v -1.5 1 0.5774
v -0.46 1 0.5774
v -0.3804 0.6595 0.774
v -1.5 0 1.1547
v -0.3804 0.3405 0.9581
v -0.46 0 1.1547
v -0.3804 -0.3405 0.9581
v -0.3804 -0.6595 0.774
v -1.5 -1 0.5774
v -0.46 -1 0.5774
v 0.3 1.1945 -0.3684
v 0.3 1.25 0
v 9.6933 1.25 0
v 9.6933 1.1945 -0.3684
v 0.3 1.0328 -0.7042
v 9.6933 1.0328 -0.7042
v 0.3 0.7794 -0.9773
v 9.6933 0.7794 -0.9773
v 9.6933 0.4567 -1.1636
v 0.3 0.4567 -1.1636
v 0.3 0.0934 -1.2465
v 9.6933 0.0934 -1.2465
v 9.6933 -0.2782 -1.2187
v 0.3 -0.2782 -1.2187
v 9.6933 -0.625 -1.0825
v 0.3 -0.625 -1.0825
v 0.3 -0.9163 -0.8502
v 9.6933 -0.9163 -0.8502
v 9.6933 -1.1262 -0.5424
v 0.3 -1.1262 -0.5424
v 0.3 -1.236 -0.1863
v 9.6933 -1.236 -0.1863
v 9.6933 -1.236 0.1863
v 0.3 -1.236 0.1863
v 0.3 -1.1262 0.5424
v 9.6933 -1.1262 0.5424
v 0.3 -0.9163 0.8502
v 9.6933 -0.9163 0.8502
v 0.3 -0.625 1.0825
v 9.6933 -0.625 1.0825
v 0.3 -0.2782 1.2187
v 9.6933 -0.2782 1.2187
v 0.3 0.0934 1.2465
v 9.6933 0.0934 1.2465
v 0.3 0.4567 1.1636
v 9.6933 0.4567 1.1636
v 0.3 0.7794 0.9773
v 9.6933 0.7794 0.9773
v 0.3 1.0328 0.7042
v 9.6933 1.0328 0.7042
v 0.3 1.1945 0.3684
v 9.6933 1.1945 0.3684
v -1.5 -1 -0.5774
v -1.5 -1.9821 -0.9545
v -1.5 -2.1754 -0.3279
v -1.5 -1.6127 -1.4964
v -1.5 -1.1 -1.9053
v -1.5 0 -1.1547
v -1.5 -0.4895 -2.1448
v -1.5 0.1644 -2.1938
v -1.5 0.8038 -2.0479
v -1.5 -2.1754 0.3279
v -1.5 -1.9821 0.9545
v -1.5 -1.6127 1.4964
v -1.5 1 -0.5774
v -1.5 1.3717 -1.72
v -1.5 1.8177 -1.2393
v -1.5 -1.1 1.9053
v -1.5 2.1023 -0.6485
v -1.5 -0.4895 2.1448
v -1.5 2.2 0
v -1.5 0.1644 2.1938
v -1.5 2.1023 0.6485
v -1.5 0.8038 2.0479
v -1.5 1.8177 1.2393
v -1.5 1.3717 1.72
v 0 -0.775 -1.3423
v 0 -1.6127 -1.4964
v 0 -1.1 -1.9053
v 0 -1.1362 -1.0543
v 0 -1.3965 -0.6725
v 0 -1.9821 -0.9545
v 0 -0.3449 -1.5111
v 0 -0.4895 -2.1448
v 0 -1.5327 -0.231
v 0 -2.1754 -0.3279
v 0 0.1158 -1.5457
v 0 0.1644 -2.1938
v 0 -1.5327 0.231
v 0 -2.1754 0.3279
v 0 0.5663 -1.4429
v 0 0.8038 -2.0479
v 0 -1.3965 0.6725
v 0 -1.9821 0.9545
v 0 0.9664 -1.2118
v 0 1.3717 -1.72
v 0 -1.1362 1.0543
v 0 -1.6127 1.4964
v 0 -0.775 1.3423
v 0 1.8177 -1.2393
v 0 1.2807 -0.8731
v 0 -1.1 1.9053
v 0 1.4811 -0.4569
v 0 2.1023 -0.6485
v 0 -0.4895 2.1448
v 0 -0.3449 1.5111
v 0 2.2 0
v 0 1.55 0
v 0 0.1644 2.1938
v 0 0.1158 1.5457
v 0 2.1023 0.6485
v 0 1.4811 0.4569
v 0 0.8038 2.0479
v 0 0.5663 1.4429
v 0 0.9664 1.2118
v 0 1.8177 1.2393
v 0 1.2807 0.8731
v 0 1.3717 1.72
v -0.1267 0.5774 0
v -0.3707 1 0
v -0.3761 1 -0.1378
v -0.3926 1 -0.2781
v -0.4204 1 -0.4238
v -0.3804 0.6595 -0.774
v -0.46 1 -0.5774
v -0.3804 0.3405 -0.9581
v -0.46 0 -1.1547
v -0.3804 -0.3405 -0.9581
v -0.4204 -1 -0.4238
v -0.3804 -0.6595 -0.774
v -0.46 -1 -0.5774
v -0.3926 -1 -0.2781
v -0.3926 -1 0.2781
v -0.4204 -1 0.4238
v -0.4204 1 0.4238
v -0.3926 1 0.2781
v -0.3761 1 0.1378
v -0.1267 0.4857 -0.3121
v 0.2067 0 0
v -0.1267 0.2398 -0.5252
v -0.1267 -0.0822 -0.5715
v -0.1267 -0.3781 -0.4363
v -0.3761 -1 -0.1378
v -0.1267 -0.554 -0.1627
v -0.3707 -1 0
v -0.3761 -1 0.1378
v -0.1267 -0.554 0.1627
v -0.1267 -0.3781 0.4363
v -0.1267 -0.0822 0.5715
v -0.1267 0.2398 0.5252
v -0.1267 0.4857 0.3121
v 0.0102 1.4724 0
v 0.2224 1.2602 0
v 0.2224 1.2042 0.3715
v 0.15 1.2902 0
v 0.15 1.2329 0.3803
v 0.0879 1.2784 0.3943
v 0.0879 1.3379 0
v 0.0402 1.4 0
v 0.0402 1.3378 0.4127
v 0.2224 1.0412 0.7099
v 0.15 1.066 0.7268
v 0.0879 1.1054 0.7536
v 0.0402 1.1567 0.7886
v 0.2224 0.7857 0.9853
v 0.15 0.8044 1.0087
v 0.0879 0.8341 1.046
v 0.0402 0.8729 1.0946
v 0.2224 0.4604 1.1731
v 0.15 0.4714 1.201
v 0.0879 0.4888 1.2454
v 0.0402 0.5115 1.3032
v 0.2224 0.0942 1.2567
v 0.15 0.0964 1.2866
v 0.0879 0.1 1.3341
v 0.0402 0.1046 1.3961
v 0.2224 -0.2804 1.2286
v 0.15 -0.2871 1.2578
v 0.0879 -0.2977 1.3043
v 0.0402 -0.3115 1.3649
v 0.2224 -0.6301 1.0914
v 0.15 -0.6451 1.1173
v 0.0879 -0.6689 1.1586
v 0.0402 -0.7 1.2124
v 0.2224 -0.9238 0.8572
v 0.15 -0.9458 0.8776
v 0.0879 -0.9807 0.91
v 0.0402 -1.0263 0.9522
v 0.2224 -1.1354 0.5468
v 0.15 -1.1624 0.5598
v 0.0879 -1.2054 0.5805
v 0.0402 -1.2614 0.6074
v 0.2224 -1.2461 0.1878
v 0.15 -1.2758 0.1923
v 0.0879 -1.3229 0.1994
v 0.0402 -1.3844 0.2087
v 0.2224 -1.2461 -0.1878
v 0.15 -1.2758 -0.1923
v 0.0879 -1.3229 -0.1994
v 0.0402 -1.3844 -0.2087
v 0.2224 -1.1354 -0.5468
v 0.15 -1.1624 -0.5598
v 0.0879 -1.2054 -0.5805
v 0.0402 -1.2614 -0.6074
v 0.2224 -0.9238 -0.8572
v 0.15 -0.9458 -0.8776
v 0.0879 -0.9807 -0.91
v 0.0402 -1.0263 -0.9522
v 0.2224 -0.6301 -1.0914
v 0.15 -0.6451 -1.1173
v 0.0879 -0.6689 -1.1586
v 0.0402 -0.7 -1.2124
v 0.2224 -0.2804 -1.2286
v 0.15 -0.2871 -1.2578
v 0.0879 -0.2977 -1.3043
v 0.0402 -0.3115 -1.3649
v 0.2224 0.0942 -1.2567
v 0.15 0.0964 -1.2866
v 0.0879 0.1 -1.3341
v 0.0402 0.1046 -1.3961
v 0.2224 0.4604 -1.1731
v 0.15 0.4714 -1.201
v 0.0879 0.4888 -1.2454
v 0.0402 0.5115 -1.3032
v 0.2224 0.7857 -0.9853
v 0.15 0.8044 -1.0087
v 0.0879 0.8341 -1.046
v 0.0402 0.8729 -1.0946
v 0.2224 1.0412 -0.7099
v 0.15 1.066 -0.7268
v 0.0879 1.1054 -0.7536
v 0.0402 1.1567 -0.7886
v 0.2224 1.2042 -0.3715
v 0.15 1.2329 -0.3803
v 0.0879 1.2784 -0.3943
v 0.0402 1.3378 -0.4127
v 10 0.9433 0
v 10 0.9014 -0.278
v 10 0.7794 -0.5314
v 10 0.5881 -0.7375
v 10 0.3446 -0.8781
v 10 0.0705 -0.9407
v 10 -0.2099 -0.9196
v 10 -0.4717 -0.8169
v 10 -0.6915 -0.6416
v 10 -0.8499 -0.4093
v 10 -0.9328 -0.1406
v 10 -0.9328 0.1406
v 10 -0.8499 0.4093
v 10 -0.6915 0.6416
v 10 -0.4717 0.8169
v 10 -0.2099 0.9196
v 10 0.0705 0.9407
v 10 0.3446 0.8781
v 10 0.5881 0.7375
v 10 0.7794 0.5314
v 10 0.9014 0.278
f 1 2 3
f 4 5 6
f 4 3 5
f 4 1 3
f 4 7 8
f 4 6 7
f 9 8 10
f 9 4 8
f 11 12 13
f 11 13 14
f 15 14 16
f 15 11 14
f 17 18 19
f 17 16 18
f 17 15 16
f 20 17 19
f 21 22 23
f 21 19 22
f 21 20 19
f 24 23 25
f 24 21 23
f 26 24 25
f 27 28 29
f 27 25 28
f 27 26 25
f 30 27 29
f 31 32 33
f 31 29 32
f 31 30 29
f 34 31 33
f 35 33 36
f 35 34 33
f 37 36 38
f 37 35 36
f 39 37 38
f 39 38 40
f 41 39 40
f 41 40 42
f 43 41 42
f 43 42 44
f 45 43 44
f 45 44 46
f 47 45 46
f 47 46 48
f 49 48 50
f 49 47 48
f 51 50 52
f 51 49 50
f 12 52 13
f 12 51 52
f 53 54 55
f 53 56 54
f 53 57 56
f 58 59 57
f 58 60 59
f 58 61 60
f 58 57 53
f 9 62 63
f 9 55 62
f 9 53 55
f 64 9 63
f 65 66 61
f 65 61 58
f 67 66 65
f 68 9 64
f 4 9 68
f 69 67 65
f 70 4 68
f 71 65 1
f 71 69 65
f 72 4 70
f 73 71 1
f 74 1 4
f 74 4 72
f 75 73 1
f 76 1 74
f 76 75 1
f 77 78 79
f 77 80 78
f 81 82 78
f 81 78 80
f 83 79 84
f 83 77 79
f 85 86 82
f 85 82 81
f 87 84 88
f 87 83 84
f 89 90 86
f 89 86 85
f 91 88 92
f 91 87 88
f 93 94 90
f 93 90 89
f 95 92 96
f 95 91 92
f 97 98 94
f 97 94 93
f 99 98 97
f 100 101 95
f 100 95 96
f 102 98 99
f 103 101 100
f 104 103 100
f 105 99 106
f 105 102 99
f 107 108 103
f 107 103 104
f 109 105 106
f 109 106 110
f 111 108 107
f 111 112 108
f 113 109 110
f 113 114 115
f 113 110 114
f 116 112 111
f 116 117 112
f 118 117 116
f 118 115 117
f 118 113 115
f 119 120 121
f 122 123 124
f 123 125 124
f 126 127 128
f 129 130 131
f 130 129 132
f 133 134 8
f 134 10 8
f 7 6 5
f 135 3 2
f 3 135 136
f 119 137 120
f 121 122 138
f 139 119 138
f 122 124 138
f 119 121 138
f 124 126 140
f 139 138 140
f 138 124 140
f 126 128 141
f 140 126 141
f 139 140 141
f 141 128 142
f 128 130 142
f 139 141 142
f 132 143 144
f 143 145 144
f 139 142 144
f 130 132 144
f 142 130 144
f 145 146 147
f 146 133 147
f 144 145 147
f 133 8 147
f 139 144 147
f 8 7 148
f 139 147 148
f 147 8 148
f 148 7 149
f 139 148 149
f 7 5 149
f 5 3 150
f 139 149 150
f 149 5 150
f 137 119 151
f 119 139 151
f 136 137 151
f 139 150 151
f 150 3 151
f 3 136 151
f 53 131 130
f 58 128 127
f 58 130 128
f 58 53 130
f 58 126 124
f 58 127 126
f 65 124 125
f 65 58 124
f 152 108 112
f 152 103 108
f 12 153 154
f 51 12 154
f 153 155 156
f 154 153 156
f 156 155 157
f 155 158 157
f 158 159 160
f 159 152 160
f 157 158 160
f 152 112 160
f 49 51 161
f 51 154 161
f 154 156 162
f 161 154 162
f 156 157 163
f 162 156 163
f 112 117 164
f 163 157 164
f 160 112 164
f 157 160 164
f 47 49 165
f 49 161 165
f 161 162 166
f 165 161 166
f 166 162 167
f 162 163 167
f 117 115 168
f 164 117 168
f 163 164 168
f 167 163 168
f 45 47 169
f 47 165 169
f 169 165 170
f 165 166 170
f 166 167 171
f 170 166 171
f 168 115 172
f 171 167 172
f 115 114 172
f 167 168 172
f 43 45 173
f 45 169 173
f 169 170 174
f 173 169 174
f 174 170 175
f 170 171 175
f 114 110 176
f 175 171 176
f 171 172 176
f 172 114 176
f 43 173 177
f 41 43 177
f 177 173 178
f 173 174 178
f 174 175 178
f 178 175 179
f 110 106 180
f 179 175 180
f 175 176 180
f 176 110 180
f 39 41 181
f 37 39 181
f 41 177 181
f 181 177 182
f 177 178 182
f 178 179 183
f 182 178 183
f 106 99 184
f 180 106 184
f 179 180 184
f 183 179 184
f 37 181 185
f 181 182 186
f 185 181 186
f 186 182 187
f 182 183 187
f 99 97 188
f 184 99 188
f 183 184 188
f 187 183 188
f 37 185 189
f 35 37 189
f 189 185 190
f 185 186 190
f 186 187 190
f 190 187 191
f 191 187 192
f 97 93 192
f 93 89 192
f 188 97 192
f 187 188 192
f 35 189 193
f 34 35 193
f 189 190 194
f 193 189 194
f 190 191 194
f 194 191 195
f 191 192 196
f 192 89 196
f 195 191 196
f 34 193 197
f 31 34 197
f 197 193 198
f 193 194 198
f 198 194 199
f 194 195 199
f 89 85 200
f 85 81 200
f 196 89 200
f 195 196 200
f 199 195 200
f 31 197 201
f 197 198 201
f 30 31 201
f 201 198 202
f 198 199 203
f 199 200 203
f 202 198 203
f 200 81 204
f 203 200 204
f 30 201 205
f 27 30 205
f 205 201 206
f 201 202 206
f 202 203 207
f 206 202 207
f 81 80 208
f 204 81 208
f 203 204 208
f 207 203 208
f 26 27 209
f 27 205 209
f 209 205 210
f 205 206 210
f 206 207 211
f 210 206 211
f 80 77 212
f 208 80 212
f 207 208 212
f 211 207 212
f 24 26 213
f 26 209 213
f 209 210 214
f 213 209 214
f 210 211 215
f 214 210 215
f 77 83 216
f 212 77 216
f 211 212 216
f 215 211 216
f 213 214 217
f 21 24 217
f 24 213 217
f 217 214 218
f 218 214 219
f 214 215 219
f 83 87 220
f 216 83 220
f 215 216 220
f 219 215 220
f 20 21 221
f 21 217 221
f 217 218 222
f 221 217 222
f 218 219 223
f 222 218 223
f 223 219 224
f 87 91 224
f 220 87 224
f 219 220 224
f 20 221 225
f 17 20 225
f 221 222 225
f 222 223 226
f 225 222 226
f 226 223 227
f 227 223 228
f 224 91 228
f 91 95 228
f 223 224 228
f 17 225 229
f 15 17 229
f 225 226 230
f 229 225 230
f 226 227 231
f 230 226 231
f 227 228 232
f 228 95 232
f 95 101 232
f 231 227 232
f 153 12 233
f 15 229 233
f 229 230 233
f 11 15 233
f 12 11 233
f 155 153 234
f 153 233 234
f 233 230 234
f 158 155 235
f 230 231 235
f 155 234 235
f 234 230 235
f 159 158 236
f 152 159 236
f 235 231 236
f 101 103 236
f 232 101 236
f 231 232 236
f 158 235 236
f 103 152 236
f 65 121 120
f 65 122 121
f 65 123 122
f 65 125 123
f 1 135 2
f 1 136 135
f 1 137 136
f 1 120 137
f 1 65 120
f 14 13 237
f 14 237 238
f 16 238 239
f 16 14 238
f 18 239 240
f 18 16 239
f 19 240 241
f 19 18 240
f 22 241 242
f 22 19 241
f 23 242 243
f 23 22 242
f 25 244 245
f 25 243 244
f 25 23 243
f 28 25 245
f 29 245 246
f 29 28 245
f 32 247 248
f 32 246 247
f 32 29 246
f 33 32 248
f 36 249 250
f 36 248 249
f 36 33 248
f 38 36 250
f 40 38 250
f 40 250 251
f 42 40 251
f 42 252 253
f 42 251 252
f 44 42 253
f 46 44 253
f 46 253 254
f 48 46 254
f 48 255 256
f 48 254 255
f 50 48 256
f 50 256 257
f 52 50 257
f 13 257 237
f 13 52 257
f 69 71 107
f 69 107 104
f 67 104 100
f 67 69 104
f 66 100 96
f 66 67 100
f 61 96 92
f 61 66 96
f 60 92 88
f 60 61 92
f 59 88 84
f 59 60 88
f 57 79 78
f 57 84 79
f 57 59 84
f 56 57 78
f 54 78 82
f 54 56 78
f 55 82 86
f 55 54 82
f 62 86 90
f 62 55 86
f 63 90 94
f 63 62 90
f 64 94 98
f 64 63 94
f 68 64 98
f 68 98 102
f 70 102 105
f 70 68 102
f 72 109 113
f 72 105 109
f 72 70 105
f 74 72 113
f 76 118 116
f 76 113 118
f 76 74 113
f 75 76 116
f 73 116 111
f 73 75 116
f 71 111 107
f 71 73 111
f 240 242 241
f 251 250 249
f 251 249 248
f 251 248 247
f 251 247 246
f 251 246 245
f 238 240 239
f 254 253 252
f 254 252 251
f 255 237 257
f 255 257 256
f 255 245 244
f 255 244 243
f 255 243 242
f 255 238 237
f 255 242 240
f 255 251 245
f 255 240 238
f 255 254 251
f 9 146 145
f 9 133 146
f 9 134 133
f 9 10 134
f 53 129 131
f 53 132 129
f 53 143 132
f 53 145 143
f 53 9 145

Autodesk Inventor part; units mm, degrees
ref_plane "YZ Plane" through (0, 0, 0) normal (1, 0, 0) x (0, 1, 0)
ref_plane "XZ Plane" through (0, 0, 0) normal (0, 1, 0) x (-1, 0, 0)
sketch "Sketch1" plane through (0, 0, 0) normal (0, 0, 1) x (1, 0, 0)
  line L0 (0.2067, 0) -> (10, 0)
  line L1 (10, 0) -> (10, 1.25)
  line L2 (10, 1.25) -> (1.5, 1.25)
  line L3 (1.5, 1.25) -> (1.1932, 1.25)
  line L4 (1.1932, 1.25) -> (0, 1.25)
  line L5 (0, 1.25) -> (0, 2.2)
  line L6 (0, 2.2) -> (-1.5, 2.2)
  line L7 (-1.5, 2.2) -> (-1.5, 1.1547)
  line L8 (-1.5, 1.1547) -> (-0.46, 1.1547)
  line L9 (-0.46, 1.1547) -> (0.2067, 0)
  line L10 (-3.8, 0) -> (12.3, 0) projected
  line L11 (0, -0.44) -> (0, 2.64) projected
  line L12 (1.5, 1.25) -> (0, 1.25) construction
  dimension "d1" = 8.5
  dimension "d2" = 0.3068
  dimension "d3" = 1.5
  dimension "d4" = 1.04
  dimension "d5" = 60
  dimension "d6" = 2.5
  dimension "d7" = 2.5
  dimension "d8" = 2.3094
  dimension "d9" = 4.4
  dimension "d26" = 10
revolve "Body" add sketch "Sketch1" angle 360 about axis through (0.2067, 0, 0) along (1, 0, 0) contours L9 L11 L4 L3 L2 L1 L0 | L9 L8 L7 L6 L5 L11
sketch "Sketch2" plane through (-1.5, 0, 0) normal (-1, 0, 0) x (0, 0, 1)
  circle A0 centre (0, 0) radius 1.1547 projected
  line L0 (0, -3.08) -> (0, 3.08) projected
  line L1 (-3.08, 0) -> (3.08, 0) projected
  line L2 (1.1547, 0) -> (0.5774, -1)
  line L3 (0.5774, -1) -> (-0.5774, -1)
  line L4 (-0.5774, -1) -> (-1.1547, 0)
  line L5 (-1.1547, 0) -> (-0.5774, 1)
  line L6 (-0.5774, 1) -> (0.5774, 1)
  line L7 (0.5774, 1) -> (1.1547, 0)
extrude "Slot" add sketch "Sketch2" against normal up to next contours L7 A0 | A0 L2 | L6 L0 A0 | A0 L0 L3 | L0 L6 A0 | A0 L3 L0 | L4 A0 | A0 L5
thread "Thread" size "M2.5x0.45" class "6g" standard "ISO Metric profile" length 8.5
chamfer "Chamfer1" distance 0.3067 distance2 0.3067 1 edges at (10, -1.25, 0) measured on face at (10, -0.2714, -0.6096)
ref_plane "Work Plane1" through (29, 0, 0) normal (0, -1, 0) x (1, 0, 0)
fillet "Fillet2" radius 0.3 1 edges at (0, -1.25, 0)
equation "\"d30\" = R"
equation "\"d13\" = GEL"
equation "\"d15\" = -0.5 * SPD + 0.5 * GD"
equation "\"d16\" = GUL"
equation "\"d1\" = GEL"
equation "\"d4\" = INTI"
equation "\"d8\" = 1.1547 * SW"
equation "\"d26\" = NLG"
equation "\"GD\" = NND"
equation "\"NLG\" = 10"
equation "\"GEL\" = 8.5"
equation "\"KOD\" = 5.7"
equation "\"KOH\" = 1.65"
equation "\"INTI\" = 1.04"
equation "\"GAL\" = 0.61345 * PTC"
equation "\"GUL\" = 0.61345 * PTC"
equation "\"BDM\" = NND"
equation "\"SW\" = 2"
equation "\"RR\" = 1.45"
equation "\"SPD\" = NND - 1.2269 * PTC"
equation "\"R\" = 0.3"
equation "\"TOA\" = 30deg"
equation "\"GD1\" = THREADDIA - 1.2269 * PTC"
equation "\"THREADDIA\" = 3"
equation "\"PTC\" = 0.5"
equation "\"NND\" = 3"
equation "\"KOH1\" = 0.2"
equation "\"E0\" = 2.303"
properties part number "ISO 7380-1 - M3 x 10" material "Steel"
